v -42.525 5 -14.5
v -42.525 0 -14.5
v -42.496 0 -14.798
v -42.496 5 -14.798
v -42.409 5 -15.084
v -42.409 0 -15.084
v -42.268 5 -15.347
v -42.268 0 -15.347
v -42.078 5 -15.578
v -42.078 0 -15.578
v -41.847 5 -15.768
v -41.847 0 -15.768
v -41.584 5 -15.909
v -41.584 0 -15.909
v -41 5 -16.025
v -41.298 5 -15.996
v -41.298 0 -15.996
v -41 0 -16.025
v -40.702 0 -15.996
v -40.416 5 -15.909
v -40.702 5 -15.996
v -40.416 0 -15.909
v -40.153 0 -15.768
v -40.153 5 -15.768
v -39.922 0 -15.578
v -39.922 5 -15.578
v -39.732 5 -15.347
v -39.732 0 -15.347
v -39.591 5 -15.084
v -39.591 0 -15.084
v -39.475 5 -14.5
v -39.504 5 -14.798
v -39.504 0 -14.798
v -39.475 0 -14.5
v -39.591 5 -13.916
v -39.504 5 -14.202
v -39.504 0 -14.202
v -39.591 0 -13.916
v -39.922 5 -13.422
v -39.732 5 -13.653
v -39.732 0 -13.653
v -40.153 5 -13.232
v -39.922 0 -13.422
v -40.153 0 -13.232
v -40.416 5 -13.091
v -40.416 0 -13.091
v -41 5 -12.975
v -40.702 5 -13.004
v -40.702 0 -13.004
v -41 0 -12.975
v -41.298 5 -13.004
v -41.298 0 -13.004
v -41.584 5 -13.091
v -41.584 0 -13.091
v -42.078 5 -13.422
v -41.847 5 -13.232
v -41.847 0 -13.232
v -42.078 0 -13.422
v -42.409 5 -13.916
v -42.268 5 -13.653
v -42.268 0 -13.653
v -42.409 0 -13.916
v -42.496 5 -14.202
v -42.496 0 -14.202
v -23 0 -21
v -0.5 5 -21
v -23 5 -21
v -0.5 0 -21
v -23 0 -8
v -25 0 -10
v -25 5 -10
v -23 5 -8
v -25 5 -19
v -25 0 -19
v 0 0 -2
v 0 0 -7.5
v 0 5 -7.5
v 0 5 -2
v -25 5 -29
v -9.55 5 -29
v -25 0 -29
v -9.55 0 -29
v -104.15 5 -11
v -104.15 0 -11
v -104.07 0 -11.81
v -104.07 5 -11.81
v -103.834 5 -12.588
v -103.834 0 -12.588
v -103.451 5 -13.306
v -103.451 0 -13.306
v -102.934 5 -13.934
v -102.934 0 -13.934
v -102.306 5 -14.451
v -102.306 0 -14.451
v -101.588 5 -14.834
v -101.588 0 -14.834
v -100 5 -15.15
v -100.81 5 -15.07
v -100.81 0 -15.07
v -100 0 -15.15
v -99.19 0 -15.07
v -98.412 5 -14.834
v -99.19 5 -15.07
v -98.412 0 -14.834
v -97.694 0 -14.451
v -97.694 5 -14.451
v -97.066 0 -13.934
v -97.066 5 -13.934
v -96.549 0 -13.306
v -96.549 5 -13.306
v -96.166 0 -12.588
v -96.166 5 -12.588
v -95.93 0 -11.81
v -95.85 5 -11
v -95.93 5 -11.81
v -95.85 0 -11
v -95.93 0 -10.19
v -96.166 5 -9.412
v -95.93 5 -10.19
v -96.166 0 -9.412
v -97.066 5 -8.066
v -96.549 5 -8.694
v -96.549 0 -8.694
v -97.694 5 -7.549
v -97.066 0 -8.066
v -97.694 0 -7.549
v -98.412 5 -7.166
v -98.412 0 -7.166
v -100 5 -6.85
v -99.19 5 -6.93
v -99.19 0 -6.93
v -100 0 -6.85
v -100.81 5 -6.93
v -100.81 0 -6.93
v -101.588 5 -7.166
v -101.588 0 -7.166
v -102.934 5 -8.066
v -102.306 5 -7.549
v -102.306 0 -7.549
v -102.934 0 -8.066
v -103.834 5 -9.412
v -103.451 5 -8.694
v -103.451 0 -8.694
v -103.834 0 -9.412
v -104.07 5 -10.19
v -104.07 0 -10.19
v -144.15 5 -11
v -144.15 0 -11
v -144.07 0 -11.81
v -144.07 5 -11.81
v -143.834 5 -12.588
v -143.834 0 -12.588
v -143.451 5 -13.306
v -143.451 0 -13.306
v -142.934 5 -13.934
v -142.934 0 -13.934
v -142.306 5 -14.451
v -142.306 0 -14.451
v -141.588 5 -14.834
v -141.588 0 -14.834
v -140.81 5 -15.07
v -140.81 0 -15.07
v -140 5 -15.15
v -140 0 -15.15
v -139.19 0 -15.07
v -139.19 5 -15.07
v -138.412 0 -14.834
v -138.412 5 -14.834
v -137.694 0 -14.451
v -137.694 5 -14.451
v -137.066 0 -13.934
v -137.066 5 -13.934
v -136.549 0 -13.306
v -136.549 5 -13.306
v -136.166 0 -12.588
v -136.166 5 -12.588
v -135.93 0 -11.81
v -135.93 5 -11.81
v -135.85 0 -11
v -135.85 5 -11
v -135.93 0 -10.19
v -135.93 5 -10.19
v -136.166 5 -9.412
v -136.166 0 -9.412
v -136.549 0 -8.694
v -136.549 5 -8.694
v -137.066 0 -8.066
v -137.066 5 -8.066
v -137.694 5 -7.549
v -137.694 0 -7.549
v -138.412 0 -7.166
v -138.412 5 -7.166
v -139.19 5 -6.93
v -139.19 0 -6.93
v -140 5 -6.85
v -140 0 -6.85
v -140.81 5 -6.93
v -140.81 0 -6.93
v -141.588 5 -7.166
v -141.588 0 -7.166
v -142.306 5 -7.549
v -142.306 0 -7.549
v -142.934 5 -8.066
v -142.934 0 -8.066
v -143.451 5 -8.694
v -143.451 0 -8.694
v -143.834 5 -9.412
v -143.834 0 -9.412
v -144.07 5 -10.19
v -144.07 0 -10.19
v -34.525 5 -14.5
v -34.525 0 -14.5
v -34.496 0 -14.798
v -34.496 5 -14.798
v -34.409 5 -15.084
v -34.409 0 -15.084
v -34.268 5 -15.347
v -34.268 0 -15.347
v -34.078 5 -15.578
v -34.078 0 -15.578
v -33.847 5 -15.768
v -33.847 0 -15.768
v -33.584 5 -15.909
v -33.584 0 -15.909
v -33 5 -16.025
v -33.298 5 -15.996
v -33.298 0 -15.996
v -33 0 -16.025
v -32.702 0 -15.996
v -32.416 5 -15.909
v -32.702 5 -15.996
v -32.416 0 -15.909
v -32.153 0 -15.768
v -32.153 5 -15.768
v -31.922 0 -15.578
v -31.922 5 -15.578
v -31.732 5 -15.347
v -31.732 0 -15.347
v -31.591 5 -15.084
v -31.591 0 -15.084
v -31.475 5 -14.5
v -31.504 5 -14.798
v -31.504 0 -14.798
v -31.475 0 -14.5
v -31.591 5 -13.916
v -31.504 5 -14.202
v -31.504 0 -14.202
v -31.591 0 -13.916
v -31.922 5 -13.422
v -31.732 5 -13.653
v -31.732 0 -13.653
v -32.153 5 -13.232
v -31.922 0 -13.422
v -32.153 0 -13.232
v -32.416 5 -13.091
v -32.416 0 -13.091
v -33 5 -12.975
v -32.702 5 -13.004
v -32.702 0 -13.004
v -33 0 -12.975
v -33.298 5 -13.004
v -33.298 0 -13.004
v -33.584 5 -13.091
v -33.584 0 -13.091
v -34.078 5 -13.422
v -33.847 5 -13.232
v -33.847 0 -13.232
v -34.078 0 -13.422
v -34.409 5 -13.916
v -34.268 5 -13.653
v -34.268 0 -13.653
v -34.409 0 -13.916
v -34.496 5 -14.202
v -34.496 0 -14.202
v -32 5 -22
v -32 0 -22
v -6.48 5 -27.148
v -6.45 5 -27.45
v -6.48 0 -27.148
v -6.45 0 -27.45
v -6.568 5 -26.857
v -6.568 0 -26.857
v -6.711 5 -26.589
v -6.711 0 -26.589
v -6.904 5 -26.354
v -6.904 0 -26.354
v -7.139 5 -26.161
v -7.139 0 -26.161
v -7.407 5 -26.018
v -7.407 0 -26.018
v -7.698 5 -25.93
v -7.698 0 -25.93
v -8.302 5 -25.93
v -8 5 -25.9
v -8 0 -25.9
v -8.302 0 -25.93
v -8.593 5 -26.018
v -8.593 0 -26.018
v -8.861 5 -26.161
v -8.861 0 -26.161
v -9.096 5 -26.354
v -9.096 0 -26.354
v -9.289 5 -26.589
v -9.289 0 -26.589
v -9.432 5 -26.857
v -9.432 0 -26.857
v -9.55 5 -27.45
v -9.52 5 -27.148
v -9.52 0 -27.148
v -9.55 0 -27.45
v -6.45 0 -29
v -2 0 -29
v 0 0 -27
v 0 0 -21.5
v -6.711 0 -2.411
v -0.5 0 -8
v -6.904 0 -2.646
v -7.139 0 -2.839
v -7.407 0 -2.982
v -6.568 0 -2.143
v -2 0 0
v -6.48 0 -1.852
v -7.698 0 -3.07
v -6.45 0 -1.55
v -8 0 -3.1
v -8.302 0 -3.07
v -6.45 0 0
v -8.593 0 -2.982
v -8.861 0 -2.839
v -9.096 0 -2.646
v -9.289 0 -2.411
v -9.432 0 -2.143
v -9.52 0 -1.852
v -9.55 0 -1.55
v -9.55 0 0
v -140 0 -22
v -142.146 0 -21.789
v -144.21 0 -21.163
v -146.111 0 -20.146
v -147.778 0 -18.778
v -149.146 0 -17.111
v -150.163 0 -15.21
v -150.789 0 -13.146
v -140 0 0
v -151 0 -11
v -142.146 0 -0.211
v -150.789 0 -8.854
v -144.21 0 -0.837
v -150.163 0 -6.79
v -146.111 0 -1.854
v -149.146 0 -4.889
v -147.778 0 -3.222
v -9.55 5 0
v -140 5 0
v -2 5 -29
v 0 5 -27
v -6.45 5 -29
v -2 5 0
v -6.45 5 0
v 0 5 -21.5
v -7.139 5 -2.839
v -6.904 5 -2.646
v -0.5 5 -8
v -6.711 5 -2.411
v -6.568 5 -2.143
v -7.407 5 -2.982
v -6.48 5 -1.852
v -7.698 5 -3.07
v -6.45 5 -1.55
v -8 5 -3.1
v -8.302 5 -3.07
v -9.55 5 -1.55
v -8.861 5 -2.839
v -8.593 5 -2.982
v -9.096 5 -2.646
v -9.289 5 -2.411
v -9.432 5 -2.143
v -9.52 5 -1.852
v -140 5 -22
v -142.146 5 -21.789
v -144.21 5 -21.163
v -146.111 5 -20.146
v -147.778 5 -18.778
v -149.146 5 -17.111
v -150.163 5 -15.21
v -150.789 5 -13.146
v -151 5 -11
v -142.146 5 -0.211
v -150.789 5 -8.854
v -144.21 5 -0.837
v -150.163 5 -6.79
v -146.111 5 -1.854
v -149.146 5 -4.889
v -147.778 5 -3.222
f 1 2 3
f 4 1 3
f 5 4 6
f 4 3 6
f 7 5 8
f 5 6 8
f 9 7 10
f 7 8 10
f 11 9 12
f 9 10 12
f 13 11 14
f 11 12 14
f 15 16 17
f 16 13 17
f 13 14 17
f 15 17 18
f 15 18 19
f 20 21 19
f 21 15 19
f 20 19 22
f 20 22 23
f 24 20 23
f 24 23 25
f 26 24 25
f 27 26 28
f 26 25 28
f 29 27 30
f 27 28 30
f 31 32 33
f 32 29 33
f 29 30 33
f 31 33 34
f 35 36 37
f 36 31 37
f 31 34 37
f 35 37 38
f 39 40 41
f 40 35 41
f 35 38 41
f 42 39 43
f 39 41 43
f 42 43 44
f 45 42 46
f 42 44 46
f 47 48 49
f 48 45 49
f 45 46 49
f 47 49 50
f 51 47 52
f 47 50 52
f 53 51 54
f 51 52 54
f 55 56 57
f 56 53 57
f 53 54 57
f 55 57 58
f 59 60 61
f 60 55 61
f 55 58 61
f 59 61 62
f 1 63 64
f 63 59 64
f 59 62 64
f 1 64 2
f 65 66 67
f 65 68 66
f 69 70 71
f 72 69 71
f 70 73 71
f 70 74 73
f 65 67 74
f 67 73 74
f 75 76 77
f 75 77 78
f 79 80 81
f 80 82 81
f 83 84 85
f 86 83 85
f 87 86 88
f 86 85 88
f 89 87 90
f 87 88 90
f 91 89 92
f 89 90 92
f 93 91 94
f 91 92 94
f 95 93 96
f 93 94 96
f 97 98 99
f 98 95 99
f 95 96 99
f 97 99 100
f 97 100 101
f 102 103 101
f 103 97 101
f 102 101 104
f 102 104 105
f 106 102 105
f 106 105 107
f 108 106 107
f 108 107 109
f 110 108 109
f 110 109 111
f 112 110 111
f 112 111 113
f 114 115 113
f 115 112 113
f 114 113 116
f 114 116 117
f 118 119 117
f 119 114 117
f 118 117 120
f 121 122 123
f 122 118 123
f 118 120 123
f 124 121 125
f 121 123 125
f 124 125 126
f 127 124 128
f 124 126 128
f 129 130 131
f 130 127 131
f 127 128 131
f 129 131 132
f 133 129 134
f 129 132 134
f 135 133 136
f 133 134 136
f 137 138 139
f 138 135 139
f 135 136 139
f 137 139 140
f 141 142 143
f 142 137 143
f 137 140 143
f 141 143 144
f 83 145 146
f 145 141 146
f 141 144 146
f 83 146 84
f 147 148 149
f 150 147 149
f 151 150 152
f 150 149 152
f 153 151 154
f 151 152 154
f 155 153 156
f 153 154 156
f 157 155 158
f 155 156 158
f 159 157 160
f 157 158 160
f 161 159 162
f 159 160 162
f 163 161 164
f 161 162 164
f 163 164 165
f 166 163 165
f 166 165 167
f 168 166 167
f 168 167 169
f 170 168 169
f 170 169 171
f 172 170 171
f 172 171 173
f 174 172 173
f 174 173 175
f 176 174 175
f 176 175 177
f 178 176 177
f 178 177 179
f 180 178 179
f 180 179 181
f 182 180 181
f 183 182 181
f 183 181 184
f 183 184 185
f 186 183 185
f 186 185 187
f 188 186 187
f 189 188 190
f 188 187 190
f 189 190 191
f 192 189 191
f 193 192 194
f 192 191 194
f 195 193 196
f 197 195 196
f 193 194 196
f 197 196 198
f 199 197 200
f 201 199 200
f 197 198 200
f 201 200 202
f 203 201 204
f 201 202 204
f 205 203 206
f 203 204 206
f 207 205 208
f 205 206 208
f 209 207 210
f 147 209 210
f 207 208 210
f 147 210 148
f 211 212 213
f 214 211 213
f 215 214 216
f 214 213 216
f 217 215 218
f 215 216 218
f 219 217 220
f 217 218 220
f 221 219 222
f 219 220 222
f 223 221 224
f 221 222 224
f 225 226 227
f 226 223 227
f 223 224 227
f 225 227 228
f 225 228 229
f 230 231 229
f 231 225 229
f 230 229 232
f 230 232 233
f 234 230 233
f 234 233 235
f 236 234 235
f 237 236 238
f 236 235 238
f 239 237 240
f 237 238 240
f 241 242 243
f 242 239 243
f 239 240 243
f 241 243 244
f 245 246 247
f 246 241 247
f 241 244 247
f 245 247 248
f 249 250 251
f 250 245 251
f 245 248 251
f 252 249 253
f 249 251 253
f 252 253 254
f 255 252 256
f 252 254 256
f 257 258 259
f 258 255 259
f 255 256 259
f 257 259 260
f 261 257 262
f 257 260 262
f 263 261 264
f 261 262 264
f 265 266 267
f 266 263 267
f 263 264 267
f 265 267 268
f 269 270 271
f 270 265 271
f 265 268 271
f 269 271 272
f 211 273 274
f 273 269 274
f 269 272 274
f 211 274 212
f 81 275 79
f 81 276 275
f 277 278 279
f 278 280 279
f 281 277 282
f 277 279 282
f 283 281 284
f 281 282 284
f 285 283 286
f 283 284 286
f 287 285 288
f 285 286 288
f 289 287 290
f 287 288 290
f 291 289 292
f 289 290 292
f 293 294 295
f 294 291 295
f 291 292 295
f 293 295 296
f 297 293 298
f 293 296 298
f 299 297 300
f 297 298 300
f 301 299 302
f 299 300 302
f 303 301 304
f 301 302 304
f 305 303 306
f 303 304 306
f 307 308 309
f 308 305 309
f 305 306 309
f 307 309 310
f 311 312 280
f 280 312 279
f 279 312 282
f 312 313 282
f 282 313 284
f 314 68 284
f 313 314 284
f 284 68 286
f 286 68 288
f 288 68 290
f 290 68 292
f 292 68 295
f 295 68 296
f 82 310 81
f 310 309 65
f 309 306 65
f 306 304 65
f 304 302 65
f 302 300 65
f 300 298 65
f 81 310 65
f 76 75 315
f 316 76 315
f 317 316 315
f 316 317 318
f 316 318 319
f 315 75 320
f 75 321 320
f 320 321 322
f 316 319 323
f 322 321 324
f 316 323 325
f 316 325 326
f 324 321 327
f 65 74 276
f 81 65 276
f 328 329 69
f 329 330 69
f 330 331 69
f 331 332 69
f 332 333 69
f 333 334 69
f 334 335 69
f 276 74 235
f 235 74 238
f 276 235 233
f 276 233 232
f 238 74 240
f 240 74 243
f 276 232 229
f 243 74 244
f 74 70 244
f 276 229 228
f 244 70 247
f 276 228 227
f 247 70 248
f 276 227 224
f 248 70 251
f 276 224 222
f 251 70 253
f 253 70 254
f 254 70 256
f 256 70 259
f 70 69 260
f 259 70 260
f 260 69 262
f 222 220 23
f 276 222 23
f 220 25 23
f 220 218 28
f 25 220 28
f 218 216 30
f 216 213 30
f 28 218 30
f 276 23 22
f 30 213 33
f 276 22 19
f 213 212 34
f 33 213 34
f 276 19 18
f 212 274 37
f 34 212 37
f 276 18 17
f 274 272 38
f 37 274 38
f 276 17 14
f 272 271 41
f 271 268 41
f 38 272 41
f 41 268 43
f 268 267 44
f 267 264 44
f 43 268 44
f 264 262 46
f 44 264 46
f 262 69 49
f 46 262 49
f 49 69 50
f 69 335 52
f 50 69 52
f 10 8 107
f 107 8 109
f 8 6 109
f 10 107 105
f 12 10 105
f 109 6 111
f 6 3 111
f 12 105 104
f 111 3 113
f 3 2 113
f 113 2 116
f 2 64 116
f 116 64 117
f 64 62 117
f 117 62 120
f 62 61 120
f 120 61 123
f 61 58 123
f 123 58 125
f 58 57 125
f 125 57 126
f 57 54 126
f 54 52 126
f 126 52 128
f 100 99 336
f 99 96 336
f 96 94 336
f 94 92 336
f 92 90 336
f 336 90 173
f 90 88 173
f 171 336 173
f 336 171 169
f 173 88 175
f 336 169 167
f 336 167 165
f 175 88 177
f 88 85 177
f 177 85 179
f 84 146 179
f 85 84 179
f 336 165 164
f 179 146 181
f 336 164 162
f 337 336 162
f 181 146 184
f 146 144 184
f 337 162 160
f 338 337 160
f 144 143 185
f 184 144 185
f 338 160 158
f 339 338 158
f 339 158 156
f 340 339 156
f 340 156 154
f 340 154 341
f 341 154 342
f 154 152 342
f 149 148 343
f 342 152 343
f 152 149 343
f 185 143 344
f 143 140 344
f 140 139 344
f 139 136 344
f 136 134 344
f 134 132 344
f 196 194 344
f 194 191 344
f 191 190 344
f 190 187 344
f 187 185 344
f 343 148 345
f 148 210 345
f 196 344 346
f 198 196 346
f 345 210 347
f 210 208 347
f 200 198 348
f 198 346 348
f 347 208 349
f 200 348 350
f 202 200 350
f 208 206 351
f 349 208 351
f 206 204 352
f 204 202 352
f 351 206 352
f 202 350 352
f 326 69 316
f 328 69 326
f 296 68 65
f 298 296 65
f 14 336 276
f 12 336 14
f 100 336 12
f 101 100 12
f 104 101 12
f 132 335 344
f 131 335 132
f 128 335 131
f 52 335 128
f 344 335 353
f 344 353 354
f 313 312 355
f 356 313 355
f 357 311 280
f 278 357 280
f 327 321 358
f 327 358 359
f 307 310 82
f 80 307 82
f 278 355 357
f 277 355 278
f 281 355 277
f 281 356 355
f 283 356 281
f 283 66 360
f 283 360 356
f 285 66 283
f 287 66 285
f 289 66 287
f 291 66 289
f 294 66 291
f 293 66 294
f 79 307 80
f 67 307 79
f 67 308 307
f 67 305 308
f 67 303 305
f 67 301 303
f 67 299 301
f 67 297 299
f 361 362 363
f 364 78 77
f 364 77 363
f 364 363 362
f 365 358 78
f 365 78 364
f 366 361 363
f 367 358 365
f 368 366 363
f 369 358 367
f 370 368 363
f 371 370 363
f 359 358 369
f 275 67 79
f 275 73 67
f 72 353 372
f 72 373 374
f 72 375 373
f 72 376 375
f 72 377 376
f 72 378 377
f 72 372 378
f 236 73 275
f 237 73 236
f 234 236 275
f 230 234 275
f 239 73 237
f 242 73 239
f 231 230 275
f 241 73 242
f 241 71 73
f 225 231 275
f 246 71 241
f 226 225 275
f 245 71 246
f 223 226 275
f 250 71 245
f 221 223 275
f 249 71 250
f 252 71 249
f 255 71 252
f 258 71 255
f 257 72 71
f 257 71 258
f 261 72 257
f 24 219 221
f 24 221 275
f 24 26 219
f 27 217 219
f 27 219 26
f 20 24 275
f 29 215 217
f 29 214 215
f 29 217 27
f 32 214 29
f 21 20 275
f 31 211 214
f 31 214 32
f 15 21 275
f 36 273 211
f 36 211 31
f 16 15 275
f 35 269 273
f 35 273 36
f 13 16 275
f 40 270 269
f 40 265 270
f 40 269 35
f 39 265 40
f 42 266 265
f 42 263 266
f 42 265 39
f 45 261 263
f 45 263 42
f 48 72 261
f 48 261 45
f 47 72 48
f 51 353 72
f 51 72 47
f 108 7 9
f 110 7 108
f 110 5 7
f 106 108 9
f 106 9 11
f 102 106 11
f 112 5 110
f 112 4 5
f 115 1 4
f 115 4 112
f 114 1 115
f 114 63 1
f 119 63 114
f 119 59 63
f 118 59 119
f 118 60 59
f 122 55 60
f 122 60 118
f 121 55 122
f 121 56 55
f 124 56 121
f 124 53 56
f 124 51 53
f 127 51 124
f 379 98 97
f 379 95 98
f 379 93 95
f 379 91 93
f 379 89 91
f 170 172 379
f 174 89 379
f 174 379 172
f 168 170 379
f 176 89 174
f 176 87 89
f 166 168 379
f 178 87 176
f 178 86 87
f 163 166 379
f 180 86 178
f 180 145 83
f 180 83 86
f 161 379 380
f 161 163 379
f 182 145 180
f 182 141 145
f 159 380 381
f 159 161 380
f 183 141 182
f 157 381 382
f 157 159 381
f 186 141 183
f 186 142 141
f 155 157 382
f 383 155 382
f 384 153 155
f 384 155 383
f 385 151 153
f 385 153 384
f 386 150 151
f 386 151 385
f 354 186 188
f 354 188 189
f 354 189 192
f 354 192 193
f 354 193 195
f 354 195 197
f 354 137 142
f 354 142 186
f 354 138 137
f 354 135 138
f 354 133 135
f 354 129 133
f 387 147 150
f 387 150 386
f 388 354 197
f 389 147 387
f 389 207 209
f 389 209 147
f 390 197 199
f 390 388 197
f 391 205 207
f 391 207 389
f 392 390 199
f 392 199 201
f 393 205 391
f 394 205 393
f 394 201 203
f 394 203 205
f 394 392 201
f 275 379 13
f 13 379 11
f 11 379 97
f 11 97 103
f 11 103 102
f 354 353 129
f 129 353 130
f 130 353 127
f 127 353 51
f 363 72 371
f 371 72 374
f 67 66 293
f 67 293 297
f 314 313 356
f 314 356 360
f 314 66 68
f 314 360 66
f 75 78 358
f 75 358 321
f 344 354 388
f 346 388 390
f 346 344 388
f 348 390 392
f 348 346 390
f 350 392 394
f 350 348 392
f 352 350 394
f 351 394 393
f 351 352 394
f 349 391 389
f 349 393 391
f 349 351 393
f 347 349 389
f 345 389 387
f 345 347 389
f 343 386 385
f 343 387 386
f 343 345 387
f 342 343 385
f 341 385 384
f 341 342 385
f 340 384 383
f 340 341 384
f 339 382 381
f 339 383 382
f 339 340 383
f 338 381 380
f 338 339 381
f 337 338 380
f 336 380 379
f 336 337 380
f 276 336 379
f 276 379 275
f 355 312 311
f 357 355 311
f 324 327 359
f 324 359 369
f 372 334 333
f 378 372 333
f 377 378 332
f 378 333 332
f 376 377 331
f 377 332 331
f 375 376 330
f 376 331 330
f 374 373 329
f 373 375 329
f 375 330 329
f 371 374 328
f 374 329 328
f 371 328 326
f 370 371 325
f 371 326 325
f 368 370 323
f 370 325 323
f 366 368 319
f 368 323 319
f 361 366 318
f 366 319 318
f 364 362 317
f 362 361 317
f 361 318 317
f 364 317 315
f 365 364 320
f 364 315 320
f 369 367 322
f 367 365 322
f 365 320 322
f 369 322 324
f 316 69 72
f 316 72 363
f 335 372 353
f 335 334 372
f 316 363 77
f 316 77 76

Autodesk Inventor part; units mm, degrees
ref_plane "YZ Plane" through (0, 0, 0) normal (1, 0, 0) x (0, 1, 0)
ref_plane "XZ Plane" through (0, 0, 0) normal (0, 1, 0) x (-1, 0, 0)
ref_plane "XY Plane" through (0, 0, 0) normal (0, 0, 1) x (1, 0, 0)
sketch "草图1" plane through (0, 0, 0) normal (0, 1, 0) x (-1, 0, 0)
  line L0 (0, 0) -> (140, 0)
  line L1 (140, 0) -> (140, -22)
  line L2 (140, -22) -> (0, -22)
  line L3 (0, -22) -> (0, 0)
  circle A0 centre (100, -11) radius 11
  circle A1 centre (100, -11) radius 4.15
  circle A2 centre (140, -11) radius 11
  circle A3 centre (140, -11) radius 4.15
  line L4 (25, -8) -> (0, -8)
  line L5 (0, -8) -> (0, -21)
  line L6 (0, -21) -> (25, -21)
  line L7 (25, -21) -> (25, -8)
  line L8 (32, -22) -> (0, -22)
  line L9 (0, -22) -> (0, -29)
  line L10 (0, -29) -> (32, -29)
  line L11 (32, -29) -> (32, -22)
  line L12 (32, -22) -> (25, -29)
  circle A4 centre (8, -1.55) radius 1.55
  line L13 (9.55, 0) -> (6.45, 0)
  line L14 (6.45, 0) -> (6.45, -1.55)
  line L15 (6.45, -1.55) -> (9.55, -1.55)
  line L16 (9.55, -1.55) -> (9.55, 0)
  circle A5 centre (33, -14.5) radius 1.525
  line L17 (25, -14.5) -> (20.7418, -14.5)
  circle A6 centre (41, -14.5) radius 1.525
  circle A7 centre (8, -27.45) radius 1.55
  line L18 (6.45, -27.45) -> (9.55, -27.45)
  line L19 (9.55, -27.45) -> (9.55, -29)
  line L20 (9.55, -29) -> (6.45, -29)
  line L21 (6.45, -29) -> (6.45, -27.45)
  point P0 (9.55, -1.55)
  point P1 (6.45, 0)
  point P2 (0, -8)
  point P3 (6.45, -29)
  dimension "d11" = 3.1
  dimension "d17" = 3.1
  dimension "d0" = 22
  dimension "d1" = 140
  dimension "d2" = 100
  dimension "d3" = 8.3
  dimension "d4" = 8.3
  dimension "d5" = 13
  dimension "d6" = 8
  dimension "d7" = 8
  dimension "d8" = 45
  dimension "d9" = 25
  dimension "d10" = 32
  dimension "d12" = 3.05
  dimension "d13" = 8
  dimension "d14" = 3.05
  dimension "d15" = 8
  dimension "d16" = 8
extrude "拉伸1" add sketch "草图1" along normal blind 5 contours L0 L14 A4 L16 A0 L2 L3 L6 L7 L4 | L2 L12 L10 L19 A7 L21 L9 | L0 A2 L2 A0 | A0 | A2 L1 A3 | L1 A3 A2
chamfer "倒角1" distance 2 angle 45 4 edges at (0, 2.5, 0) (-25, 2.5, -21) (0, 2.5, -29) (-25, 2.5, -8)
chamfer "倒角2" distance 0.5 angle 45 2 edges at (0, 2.5, -8) (0, 2.5, -21)
properties part number "leg2"
